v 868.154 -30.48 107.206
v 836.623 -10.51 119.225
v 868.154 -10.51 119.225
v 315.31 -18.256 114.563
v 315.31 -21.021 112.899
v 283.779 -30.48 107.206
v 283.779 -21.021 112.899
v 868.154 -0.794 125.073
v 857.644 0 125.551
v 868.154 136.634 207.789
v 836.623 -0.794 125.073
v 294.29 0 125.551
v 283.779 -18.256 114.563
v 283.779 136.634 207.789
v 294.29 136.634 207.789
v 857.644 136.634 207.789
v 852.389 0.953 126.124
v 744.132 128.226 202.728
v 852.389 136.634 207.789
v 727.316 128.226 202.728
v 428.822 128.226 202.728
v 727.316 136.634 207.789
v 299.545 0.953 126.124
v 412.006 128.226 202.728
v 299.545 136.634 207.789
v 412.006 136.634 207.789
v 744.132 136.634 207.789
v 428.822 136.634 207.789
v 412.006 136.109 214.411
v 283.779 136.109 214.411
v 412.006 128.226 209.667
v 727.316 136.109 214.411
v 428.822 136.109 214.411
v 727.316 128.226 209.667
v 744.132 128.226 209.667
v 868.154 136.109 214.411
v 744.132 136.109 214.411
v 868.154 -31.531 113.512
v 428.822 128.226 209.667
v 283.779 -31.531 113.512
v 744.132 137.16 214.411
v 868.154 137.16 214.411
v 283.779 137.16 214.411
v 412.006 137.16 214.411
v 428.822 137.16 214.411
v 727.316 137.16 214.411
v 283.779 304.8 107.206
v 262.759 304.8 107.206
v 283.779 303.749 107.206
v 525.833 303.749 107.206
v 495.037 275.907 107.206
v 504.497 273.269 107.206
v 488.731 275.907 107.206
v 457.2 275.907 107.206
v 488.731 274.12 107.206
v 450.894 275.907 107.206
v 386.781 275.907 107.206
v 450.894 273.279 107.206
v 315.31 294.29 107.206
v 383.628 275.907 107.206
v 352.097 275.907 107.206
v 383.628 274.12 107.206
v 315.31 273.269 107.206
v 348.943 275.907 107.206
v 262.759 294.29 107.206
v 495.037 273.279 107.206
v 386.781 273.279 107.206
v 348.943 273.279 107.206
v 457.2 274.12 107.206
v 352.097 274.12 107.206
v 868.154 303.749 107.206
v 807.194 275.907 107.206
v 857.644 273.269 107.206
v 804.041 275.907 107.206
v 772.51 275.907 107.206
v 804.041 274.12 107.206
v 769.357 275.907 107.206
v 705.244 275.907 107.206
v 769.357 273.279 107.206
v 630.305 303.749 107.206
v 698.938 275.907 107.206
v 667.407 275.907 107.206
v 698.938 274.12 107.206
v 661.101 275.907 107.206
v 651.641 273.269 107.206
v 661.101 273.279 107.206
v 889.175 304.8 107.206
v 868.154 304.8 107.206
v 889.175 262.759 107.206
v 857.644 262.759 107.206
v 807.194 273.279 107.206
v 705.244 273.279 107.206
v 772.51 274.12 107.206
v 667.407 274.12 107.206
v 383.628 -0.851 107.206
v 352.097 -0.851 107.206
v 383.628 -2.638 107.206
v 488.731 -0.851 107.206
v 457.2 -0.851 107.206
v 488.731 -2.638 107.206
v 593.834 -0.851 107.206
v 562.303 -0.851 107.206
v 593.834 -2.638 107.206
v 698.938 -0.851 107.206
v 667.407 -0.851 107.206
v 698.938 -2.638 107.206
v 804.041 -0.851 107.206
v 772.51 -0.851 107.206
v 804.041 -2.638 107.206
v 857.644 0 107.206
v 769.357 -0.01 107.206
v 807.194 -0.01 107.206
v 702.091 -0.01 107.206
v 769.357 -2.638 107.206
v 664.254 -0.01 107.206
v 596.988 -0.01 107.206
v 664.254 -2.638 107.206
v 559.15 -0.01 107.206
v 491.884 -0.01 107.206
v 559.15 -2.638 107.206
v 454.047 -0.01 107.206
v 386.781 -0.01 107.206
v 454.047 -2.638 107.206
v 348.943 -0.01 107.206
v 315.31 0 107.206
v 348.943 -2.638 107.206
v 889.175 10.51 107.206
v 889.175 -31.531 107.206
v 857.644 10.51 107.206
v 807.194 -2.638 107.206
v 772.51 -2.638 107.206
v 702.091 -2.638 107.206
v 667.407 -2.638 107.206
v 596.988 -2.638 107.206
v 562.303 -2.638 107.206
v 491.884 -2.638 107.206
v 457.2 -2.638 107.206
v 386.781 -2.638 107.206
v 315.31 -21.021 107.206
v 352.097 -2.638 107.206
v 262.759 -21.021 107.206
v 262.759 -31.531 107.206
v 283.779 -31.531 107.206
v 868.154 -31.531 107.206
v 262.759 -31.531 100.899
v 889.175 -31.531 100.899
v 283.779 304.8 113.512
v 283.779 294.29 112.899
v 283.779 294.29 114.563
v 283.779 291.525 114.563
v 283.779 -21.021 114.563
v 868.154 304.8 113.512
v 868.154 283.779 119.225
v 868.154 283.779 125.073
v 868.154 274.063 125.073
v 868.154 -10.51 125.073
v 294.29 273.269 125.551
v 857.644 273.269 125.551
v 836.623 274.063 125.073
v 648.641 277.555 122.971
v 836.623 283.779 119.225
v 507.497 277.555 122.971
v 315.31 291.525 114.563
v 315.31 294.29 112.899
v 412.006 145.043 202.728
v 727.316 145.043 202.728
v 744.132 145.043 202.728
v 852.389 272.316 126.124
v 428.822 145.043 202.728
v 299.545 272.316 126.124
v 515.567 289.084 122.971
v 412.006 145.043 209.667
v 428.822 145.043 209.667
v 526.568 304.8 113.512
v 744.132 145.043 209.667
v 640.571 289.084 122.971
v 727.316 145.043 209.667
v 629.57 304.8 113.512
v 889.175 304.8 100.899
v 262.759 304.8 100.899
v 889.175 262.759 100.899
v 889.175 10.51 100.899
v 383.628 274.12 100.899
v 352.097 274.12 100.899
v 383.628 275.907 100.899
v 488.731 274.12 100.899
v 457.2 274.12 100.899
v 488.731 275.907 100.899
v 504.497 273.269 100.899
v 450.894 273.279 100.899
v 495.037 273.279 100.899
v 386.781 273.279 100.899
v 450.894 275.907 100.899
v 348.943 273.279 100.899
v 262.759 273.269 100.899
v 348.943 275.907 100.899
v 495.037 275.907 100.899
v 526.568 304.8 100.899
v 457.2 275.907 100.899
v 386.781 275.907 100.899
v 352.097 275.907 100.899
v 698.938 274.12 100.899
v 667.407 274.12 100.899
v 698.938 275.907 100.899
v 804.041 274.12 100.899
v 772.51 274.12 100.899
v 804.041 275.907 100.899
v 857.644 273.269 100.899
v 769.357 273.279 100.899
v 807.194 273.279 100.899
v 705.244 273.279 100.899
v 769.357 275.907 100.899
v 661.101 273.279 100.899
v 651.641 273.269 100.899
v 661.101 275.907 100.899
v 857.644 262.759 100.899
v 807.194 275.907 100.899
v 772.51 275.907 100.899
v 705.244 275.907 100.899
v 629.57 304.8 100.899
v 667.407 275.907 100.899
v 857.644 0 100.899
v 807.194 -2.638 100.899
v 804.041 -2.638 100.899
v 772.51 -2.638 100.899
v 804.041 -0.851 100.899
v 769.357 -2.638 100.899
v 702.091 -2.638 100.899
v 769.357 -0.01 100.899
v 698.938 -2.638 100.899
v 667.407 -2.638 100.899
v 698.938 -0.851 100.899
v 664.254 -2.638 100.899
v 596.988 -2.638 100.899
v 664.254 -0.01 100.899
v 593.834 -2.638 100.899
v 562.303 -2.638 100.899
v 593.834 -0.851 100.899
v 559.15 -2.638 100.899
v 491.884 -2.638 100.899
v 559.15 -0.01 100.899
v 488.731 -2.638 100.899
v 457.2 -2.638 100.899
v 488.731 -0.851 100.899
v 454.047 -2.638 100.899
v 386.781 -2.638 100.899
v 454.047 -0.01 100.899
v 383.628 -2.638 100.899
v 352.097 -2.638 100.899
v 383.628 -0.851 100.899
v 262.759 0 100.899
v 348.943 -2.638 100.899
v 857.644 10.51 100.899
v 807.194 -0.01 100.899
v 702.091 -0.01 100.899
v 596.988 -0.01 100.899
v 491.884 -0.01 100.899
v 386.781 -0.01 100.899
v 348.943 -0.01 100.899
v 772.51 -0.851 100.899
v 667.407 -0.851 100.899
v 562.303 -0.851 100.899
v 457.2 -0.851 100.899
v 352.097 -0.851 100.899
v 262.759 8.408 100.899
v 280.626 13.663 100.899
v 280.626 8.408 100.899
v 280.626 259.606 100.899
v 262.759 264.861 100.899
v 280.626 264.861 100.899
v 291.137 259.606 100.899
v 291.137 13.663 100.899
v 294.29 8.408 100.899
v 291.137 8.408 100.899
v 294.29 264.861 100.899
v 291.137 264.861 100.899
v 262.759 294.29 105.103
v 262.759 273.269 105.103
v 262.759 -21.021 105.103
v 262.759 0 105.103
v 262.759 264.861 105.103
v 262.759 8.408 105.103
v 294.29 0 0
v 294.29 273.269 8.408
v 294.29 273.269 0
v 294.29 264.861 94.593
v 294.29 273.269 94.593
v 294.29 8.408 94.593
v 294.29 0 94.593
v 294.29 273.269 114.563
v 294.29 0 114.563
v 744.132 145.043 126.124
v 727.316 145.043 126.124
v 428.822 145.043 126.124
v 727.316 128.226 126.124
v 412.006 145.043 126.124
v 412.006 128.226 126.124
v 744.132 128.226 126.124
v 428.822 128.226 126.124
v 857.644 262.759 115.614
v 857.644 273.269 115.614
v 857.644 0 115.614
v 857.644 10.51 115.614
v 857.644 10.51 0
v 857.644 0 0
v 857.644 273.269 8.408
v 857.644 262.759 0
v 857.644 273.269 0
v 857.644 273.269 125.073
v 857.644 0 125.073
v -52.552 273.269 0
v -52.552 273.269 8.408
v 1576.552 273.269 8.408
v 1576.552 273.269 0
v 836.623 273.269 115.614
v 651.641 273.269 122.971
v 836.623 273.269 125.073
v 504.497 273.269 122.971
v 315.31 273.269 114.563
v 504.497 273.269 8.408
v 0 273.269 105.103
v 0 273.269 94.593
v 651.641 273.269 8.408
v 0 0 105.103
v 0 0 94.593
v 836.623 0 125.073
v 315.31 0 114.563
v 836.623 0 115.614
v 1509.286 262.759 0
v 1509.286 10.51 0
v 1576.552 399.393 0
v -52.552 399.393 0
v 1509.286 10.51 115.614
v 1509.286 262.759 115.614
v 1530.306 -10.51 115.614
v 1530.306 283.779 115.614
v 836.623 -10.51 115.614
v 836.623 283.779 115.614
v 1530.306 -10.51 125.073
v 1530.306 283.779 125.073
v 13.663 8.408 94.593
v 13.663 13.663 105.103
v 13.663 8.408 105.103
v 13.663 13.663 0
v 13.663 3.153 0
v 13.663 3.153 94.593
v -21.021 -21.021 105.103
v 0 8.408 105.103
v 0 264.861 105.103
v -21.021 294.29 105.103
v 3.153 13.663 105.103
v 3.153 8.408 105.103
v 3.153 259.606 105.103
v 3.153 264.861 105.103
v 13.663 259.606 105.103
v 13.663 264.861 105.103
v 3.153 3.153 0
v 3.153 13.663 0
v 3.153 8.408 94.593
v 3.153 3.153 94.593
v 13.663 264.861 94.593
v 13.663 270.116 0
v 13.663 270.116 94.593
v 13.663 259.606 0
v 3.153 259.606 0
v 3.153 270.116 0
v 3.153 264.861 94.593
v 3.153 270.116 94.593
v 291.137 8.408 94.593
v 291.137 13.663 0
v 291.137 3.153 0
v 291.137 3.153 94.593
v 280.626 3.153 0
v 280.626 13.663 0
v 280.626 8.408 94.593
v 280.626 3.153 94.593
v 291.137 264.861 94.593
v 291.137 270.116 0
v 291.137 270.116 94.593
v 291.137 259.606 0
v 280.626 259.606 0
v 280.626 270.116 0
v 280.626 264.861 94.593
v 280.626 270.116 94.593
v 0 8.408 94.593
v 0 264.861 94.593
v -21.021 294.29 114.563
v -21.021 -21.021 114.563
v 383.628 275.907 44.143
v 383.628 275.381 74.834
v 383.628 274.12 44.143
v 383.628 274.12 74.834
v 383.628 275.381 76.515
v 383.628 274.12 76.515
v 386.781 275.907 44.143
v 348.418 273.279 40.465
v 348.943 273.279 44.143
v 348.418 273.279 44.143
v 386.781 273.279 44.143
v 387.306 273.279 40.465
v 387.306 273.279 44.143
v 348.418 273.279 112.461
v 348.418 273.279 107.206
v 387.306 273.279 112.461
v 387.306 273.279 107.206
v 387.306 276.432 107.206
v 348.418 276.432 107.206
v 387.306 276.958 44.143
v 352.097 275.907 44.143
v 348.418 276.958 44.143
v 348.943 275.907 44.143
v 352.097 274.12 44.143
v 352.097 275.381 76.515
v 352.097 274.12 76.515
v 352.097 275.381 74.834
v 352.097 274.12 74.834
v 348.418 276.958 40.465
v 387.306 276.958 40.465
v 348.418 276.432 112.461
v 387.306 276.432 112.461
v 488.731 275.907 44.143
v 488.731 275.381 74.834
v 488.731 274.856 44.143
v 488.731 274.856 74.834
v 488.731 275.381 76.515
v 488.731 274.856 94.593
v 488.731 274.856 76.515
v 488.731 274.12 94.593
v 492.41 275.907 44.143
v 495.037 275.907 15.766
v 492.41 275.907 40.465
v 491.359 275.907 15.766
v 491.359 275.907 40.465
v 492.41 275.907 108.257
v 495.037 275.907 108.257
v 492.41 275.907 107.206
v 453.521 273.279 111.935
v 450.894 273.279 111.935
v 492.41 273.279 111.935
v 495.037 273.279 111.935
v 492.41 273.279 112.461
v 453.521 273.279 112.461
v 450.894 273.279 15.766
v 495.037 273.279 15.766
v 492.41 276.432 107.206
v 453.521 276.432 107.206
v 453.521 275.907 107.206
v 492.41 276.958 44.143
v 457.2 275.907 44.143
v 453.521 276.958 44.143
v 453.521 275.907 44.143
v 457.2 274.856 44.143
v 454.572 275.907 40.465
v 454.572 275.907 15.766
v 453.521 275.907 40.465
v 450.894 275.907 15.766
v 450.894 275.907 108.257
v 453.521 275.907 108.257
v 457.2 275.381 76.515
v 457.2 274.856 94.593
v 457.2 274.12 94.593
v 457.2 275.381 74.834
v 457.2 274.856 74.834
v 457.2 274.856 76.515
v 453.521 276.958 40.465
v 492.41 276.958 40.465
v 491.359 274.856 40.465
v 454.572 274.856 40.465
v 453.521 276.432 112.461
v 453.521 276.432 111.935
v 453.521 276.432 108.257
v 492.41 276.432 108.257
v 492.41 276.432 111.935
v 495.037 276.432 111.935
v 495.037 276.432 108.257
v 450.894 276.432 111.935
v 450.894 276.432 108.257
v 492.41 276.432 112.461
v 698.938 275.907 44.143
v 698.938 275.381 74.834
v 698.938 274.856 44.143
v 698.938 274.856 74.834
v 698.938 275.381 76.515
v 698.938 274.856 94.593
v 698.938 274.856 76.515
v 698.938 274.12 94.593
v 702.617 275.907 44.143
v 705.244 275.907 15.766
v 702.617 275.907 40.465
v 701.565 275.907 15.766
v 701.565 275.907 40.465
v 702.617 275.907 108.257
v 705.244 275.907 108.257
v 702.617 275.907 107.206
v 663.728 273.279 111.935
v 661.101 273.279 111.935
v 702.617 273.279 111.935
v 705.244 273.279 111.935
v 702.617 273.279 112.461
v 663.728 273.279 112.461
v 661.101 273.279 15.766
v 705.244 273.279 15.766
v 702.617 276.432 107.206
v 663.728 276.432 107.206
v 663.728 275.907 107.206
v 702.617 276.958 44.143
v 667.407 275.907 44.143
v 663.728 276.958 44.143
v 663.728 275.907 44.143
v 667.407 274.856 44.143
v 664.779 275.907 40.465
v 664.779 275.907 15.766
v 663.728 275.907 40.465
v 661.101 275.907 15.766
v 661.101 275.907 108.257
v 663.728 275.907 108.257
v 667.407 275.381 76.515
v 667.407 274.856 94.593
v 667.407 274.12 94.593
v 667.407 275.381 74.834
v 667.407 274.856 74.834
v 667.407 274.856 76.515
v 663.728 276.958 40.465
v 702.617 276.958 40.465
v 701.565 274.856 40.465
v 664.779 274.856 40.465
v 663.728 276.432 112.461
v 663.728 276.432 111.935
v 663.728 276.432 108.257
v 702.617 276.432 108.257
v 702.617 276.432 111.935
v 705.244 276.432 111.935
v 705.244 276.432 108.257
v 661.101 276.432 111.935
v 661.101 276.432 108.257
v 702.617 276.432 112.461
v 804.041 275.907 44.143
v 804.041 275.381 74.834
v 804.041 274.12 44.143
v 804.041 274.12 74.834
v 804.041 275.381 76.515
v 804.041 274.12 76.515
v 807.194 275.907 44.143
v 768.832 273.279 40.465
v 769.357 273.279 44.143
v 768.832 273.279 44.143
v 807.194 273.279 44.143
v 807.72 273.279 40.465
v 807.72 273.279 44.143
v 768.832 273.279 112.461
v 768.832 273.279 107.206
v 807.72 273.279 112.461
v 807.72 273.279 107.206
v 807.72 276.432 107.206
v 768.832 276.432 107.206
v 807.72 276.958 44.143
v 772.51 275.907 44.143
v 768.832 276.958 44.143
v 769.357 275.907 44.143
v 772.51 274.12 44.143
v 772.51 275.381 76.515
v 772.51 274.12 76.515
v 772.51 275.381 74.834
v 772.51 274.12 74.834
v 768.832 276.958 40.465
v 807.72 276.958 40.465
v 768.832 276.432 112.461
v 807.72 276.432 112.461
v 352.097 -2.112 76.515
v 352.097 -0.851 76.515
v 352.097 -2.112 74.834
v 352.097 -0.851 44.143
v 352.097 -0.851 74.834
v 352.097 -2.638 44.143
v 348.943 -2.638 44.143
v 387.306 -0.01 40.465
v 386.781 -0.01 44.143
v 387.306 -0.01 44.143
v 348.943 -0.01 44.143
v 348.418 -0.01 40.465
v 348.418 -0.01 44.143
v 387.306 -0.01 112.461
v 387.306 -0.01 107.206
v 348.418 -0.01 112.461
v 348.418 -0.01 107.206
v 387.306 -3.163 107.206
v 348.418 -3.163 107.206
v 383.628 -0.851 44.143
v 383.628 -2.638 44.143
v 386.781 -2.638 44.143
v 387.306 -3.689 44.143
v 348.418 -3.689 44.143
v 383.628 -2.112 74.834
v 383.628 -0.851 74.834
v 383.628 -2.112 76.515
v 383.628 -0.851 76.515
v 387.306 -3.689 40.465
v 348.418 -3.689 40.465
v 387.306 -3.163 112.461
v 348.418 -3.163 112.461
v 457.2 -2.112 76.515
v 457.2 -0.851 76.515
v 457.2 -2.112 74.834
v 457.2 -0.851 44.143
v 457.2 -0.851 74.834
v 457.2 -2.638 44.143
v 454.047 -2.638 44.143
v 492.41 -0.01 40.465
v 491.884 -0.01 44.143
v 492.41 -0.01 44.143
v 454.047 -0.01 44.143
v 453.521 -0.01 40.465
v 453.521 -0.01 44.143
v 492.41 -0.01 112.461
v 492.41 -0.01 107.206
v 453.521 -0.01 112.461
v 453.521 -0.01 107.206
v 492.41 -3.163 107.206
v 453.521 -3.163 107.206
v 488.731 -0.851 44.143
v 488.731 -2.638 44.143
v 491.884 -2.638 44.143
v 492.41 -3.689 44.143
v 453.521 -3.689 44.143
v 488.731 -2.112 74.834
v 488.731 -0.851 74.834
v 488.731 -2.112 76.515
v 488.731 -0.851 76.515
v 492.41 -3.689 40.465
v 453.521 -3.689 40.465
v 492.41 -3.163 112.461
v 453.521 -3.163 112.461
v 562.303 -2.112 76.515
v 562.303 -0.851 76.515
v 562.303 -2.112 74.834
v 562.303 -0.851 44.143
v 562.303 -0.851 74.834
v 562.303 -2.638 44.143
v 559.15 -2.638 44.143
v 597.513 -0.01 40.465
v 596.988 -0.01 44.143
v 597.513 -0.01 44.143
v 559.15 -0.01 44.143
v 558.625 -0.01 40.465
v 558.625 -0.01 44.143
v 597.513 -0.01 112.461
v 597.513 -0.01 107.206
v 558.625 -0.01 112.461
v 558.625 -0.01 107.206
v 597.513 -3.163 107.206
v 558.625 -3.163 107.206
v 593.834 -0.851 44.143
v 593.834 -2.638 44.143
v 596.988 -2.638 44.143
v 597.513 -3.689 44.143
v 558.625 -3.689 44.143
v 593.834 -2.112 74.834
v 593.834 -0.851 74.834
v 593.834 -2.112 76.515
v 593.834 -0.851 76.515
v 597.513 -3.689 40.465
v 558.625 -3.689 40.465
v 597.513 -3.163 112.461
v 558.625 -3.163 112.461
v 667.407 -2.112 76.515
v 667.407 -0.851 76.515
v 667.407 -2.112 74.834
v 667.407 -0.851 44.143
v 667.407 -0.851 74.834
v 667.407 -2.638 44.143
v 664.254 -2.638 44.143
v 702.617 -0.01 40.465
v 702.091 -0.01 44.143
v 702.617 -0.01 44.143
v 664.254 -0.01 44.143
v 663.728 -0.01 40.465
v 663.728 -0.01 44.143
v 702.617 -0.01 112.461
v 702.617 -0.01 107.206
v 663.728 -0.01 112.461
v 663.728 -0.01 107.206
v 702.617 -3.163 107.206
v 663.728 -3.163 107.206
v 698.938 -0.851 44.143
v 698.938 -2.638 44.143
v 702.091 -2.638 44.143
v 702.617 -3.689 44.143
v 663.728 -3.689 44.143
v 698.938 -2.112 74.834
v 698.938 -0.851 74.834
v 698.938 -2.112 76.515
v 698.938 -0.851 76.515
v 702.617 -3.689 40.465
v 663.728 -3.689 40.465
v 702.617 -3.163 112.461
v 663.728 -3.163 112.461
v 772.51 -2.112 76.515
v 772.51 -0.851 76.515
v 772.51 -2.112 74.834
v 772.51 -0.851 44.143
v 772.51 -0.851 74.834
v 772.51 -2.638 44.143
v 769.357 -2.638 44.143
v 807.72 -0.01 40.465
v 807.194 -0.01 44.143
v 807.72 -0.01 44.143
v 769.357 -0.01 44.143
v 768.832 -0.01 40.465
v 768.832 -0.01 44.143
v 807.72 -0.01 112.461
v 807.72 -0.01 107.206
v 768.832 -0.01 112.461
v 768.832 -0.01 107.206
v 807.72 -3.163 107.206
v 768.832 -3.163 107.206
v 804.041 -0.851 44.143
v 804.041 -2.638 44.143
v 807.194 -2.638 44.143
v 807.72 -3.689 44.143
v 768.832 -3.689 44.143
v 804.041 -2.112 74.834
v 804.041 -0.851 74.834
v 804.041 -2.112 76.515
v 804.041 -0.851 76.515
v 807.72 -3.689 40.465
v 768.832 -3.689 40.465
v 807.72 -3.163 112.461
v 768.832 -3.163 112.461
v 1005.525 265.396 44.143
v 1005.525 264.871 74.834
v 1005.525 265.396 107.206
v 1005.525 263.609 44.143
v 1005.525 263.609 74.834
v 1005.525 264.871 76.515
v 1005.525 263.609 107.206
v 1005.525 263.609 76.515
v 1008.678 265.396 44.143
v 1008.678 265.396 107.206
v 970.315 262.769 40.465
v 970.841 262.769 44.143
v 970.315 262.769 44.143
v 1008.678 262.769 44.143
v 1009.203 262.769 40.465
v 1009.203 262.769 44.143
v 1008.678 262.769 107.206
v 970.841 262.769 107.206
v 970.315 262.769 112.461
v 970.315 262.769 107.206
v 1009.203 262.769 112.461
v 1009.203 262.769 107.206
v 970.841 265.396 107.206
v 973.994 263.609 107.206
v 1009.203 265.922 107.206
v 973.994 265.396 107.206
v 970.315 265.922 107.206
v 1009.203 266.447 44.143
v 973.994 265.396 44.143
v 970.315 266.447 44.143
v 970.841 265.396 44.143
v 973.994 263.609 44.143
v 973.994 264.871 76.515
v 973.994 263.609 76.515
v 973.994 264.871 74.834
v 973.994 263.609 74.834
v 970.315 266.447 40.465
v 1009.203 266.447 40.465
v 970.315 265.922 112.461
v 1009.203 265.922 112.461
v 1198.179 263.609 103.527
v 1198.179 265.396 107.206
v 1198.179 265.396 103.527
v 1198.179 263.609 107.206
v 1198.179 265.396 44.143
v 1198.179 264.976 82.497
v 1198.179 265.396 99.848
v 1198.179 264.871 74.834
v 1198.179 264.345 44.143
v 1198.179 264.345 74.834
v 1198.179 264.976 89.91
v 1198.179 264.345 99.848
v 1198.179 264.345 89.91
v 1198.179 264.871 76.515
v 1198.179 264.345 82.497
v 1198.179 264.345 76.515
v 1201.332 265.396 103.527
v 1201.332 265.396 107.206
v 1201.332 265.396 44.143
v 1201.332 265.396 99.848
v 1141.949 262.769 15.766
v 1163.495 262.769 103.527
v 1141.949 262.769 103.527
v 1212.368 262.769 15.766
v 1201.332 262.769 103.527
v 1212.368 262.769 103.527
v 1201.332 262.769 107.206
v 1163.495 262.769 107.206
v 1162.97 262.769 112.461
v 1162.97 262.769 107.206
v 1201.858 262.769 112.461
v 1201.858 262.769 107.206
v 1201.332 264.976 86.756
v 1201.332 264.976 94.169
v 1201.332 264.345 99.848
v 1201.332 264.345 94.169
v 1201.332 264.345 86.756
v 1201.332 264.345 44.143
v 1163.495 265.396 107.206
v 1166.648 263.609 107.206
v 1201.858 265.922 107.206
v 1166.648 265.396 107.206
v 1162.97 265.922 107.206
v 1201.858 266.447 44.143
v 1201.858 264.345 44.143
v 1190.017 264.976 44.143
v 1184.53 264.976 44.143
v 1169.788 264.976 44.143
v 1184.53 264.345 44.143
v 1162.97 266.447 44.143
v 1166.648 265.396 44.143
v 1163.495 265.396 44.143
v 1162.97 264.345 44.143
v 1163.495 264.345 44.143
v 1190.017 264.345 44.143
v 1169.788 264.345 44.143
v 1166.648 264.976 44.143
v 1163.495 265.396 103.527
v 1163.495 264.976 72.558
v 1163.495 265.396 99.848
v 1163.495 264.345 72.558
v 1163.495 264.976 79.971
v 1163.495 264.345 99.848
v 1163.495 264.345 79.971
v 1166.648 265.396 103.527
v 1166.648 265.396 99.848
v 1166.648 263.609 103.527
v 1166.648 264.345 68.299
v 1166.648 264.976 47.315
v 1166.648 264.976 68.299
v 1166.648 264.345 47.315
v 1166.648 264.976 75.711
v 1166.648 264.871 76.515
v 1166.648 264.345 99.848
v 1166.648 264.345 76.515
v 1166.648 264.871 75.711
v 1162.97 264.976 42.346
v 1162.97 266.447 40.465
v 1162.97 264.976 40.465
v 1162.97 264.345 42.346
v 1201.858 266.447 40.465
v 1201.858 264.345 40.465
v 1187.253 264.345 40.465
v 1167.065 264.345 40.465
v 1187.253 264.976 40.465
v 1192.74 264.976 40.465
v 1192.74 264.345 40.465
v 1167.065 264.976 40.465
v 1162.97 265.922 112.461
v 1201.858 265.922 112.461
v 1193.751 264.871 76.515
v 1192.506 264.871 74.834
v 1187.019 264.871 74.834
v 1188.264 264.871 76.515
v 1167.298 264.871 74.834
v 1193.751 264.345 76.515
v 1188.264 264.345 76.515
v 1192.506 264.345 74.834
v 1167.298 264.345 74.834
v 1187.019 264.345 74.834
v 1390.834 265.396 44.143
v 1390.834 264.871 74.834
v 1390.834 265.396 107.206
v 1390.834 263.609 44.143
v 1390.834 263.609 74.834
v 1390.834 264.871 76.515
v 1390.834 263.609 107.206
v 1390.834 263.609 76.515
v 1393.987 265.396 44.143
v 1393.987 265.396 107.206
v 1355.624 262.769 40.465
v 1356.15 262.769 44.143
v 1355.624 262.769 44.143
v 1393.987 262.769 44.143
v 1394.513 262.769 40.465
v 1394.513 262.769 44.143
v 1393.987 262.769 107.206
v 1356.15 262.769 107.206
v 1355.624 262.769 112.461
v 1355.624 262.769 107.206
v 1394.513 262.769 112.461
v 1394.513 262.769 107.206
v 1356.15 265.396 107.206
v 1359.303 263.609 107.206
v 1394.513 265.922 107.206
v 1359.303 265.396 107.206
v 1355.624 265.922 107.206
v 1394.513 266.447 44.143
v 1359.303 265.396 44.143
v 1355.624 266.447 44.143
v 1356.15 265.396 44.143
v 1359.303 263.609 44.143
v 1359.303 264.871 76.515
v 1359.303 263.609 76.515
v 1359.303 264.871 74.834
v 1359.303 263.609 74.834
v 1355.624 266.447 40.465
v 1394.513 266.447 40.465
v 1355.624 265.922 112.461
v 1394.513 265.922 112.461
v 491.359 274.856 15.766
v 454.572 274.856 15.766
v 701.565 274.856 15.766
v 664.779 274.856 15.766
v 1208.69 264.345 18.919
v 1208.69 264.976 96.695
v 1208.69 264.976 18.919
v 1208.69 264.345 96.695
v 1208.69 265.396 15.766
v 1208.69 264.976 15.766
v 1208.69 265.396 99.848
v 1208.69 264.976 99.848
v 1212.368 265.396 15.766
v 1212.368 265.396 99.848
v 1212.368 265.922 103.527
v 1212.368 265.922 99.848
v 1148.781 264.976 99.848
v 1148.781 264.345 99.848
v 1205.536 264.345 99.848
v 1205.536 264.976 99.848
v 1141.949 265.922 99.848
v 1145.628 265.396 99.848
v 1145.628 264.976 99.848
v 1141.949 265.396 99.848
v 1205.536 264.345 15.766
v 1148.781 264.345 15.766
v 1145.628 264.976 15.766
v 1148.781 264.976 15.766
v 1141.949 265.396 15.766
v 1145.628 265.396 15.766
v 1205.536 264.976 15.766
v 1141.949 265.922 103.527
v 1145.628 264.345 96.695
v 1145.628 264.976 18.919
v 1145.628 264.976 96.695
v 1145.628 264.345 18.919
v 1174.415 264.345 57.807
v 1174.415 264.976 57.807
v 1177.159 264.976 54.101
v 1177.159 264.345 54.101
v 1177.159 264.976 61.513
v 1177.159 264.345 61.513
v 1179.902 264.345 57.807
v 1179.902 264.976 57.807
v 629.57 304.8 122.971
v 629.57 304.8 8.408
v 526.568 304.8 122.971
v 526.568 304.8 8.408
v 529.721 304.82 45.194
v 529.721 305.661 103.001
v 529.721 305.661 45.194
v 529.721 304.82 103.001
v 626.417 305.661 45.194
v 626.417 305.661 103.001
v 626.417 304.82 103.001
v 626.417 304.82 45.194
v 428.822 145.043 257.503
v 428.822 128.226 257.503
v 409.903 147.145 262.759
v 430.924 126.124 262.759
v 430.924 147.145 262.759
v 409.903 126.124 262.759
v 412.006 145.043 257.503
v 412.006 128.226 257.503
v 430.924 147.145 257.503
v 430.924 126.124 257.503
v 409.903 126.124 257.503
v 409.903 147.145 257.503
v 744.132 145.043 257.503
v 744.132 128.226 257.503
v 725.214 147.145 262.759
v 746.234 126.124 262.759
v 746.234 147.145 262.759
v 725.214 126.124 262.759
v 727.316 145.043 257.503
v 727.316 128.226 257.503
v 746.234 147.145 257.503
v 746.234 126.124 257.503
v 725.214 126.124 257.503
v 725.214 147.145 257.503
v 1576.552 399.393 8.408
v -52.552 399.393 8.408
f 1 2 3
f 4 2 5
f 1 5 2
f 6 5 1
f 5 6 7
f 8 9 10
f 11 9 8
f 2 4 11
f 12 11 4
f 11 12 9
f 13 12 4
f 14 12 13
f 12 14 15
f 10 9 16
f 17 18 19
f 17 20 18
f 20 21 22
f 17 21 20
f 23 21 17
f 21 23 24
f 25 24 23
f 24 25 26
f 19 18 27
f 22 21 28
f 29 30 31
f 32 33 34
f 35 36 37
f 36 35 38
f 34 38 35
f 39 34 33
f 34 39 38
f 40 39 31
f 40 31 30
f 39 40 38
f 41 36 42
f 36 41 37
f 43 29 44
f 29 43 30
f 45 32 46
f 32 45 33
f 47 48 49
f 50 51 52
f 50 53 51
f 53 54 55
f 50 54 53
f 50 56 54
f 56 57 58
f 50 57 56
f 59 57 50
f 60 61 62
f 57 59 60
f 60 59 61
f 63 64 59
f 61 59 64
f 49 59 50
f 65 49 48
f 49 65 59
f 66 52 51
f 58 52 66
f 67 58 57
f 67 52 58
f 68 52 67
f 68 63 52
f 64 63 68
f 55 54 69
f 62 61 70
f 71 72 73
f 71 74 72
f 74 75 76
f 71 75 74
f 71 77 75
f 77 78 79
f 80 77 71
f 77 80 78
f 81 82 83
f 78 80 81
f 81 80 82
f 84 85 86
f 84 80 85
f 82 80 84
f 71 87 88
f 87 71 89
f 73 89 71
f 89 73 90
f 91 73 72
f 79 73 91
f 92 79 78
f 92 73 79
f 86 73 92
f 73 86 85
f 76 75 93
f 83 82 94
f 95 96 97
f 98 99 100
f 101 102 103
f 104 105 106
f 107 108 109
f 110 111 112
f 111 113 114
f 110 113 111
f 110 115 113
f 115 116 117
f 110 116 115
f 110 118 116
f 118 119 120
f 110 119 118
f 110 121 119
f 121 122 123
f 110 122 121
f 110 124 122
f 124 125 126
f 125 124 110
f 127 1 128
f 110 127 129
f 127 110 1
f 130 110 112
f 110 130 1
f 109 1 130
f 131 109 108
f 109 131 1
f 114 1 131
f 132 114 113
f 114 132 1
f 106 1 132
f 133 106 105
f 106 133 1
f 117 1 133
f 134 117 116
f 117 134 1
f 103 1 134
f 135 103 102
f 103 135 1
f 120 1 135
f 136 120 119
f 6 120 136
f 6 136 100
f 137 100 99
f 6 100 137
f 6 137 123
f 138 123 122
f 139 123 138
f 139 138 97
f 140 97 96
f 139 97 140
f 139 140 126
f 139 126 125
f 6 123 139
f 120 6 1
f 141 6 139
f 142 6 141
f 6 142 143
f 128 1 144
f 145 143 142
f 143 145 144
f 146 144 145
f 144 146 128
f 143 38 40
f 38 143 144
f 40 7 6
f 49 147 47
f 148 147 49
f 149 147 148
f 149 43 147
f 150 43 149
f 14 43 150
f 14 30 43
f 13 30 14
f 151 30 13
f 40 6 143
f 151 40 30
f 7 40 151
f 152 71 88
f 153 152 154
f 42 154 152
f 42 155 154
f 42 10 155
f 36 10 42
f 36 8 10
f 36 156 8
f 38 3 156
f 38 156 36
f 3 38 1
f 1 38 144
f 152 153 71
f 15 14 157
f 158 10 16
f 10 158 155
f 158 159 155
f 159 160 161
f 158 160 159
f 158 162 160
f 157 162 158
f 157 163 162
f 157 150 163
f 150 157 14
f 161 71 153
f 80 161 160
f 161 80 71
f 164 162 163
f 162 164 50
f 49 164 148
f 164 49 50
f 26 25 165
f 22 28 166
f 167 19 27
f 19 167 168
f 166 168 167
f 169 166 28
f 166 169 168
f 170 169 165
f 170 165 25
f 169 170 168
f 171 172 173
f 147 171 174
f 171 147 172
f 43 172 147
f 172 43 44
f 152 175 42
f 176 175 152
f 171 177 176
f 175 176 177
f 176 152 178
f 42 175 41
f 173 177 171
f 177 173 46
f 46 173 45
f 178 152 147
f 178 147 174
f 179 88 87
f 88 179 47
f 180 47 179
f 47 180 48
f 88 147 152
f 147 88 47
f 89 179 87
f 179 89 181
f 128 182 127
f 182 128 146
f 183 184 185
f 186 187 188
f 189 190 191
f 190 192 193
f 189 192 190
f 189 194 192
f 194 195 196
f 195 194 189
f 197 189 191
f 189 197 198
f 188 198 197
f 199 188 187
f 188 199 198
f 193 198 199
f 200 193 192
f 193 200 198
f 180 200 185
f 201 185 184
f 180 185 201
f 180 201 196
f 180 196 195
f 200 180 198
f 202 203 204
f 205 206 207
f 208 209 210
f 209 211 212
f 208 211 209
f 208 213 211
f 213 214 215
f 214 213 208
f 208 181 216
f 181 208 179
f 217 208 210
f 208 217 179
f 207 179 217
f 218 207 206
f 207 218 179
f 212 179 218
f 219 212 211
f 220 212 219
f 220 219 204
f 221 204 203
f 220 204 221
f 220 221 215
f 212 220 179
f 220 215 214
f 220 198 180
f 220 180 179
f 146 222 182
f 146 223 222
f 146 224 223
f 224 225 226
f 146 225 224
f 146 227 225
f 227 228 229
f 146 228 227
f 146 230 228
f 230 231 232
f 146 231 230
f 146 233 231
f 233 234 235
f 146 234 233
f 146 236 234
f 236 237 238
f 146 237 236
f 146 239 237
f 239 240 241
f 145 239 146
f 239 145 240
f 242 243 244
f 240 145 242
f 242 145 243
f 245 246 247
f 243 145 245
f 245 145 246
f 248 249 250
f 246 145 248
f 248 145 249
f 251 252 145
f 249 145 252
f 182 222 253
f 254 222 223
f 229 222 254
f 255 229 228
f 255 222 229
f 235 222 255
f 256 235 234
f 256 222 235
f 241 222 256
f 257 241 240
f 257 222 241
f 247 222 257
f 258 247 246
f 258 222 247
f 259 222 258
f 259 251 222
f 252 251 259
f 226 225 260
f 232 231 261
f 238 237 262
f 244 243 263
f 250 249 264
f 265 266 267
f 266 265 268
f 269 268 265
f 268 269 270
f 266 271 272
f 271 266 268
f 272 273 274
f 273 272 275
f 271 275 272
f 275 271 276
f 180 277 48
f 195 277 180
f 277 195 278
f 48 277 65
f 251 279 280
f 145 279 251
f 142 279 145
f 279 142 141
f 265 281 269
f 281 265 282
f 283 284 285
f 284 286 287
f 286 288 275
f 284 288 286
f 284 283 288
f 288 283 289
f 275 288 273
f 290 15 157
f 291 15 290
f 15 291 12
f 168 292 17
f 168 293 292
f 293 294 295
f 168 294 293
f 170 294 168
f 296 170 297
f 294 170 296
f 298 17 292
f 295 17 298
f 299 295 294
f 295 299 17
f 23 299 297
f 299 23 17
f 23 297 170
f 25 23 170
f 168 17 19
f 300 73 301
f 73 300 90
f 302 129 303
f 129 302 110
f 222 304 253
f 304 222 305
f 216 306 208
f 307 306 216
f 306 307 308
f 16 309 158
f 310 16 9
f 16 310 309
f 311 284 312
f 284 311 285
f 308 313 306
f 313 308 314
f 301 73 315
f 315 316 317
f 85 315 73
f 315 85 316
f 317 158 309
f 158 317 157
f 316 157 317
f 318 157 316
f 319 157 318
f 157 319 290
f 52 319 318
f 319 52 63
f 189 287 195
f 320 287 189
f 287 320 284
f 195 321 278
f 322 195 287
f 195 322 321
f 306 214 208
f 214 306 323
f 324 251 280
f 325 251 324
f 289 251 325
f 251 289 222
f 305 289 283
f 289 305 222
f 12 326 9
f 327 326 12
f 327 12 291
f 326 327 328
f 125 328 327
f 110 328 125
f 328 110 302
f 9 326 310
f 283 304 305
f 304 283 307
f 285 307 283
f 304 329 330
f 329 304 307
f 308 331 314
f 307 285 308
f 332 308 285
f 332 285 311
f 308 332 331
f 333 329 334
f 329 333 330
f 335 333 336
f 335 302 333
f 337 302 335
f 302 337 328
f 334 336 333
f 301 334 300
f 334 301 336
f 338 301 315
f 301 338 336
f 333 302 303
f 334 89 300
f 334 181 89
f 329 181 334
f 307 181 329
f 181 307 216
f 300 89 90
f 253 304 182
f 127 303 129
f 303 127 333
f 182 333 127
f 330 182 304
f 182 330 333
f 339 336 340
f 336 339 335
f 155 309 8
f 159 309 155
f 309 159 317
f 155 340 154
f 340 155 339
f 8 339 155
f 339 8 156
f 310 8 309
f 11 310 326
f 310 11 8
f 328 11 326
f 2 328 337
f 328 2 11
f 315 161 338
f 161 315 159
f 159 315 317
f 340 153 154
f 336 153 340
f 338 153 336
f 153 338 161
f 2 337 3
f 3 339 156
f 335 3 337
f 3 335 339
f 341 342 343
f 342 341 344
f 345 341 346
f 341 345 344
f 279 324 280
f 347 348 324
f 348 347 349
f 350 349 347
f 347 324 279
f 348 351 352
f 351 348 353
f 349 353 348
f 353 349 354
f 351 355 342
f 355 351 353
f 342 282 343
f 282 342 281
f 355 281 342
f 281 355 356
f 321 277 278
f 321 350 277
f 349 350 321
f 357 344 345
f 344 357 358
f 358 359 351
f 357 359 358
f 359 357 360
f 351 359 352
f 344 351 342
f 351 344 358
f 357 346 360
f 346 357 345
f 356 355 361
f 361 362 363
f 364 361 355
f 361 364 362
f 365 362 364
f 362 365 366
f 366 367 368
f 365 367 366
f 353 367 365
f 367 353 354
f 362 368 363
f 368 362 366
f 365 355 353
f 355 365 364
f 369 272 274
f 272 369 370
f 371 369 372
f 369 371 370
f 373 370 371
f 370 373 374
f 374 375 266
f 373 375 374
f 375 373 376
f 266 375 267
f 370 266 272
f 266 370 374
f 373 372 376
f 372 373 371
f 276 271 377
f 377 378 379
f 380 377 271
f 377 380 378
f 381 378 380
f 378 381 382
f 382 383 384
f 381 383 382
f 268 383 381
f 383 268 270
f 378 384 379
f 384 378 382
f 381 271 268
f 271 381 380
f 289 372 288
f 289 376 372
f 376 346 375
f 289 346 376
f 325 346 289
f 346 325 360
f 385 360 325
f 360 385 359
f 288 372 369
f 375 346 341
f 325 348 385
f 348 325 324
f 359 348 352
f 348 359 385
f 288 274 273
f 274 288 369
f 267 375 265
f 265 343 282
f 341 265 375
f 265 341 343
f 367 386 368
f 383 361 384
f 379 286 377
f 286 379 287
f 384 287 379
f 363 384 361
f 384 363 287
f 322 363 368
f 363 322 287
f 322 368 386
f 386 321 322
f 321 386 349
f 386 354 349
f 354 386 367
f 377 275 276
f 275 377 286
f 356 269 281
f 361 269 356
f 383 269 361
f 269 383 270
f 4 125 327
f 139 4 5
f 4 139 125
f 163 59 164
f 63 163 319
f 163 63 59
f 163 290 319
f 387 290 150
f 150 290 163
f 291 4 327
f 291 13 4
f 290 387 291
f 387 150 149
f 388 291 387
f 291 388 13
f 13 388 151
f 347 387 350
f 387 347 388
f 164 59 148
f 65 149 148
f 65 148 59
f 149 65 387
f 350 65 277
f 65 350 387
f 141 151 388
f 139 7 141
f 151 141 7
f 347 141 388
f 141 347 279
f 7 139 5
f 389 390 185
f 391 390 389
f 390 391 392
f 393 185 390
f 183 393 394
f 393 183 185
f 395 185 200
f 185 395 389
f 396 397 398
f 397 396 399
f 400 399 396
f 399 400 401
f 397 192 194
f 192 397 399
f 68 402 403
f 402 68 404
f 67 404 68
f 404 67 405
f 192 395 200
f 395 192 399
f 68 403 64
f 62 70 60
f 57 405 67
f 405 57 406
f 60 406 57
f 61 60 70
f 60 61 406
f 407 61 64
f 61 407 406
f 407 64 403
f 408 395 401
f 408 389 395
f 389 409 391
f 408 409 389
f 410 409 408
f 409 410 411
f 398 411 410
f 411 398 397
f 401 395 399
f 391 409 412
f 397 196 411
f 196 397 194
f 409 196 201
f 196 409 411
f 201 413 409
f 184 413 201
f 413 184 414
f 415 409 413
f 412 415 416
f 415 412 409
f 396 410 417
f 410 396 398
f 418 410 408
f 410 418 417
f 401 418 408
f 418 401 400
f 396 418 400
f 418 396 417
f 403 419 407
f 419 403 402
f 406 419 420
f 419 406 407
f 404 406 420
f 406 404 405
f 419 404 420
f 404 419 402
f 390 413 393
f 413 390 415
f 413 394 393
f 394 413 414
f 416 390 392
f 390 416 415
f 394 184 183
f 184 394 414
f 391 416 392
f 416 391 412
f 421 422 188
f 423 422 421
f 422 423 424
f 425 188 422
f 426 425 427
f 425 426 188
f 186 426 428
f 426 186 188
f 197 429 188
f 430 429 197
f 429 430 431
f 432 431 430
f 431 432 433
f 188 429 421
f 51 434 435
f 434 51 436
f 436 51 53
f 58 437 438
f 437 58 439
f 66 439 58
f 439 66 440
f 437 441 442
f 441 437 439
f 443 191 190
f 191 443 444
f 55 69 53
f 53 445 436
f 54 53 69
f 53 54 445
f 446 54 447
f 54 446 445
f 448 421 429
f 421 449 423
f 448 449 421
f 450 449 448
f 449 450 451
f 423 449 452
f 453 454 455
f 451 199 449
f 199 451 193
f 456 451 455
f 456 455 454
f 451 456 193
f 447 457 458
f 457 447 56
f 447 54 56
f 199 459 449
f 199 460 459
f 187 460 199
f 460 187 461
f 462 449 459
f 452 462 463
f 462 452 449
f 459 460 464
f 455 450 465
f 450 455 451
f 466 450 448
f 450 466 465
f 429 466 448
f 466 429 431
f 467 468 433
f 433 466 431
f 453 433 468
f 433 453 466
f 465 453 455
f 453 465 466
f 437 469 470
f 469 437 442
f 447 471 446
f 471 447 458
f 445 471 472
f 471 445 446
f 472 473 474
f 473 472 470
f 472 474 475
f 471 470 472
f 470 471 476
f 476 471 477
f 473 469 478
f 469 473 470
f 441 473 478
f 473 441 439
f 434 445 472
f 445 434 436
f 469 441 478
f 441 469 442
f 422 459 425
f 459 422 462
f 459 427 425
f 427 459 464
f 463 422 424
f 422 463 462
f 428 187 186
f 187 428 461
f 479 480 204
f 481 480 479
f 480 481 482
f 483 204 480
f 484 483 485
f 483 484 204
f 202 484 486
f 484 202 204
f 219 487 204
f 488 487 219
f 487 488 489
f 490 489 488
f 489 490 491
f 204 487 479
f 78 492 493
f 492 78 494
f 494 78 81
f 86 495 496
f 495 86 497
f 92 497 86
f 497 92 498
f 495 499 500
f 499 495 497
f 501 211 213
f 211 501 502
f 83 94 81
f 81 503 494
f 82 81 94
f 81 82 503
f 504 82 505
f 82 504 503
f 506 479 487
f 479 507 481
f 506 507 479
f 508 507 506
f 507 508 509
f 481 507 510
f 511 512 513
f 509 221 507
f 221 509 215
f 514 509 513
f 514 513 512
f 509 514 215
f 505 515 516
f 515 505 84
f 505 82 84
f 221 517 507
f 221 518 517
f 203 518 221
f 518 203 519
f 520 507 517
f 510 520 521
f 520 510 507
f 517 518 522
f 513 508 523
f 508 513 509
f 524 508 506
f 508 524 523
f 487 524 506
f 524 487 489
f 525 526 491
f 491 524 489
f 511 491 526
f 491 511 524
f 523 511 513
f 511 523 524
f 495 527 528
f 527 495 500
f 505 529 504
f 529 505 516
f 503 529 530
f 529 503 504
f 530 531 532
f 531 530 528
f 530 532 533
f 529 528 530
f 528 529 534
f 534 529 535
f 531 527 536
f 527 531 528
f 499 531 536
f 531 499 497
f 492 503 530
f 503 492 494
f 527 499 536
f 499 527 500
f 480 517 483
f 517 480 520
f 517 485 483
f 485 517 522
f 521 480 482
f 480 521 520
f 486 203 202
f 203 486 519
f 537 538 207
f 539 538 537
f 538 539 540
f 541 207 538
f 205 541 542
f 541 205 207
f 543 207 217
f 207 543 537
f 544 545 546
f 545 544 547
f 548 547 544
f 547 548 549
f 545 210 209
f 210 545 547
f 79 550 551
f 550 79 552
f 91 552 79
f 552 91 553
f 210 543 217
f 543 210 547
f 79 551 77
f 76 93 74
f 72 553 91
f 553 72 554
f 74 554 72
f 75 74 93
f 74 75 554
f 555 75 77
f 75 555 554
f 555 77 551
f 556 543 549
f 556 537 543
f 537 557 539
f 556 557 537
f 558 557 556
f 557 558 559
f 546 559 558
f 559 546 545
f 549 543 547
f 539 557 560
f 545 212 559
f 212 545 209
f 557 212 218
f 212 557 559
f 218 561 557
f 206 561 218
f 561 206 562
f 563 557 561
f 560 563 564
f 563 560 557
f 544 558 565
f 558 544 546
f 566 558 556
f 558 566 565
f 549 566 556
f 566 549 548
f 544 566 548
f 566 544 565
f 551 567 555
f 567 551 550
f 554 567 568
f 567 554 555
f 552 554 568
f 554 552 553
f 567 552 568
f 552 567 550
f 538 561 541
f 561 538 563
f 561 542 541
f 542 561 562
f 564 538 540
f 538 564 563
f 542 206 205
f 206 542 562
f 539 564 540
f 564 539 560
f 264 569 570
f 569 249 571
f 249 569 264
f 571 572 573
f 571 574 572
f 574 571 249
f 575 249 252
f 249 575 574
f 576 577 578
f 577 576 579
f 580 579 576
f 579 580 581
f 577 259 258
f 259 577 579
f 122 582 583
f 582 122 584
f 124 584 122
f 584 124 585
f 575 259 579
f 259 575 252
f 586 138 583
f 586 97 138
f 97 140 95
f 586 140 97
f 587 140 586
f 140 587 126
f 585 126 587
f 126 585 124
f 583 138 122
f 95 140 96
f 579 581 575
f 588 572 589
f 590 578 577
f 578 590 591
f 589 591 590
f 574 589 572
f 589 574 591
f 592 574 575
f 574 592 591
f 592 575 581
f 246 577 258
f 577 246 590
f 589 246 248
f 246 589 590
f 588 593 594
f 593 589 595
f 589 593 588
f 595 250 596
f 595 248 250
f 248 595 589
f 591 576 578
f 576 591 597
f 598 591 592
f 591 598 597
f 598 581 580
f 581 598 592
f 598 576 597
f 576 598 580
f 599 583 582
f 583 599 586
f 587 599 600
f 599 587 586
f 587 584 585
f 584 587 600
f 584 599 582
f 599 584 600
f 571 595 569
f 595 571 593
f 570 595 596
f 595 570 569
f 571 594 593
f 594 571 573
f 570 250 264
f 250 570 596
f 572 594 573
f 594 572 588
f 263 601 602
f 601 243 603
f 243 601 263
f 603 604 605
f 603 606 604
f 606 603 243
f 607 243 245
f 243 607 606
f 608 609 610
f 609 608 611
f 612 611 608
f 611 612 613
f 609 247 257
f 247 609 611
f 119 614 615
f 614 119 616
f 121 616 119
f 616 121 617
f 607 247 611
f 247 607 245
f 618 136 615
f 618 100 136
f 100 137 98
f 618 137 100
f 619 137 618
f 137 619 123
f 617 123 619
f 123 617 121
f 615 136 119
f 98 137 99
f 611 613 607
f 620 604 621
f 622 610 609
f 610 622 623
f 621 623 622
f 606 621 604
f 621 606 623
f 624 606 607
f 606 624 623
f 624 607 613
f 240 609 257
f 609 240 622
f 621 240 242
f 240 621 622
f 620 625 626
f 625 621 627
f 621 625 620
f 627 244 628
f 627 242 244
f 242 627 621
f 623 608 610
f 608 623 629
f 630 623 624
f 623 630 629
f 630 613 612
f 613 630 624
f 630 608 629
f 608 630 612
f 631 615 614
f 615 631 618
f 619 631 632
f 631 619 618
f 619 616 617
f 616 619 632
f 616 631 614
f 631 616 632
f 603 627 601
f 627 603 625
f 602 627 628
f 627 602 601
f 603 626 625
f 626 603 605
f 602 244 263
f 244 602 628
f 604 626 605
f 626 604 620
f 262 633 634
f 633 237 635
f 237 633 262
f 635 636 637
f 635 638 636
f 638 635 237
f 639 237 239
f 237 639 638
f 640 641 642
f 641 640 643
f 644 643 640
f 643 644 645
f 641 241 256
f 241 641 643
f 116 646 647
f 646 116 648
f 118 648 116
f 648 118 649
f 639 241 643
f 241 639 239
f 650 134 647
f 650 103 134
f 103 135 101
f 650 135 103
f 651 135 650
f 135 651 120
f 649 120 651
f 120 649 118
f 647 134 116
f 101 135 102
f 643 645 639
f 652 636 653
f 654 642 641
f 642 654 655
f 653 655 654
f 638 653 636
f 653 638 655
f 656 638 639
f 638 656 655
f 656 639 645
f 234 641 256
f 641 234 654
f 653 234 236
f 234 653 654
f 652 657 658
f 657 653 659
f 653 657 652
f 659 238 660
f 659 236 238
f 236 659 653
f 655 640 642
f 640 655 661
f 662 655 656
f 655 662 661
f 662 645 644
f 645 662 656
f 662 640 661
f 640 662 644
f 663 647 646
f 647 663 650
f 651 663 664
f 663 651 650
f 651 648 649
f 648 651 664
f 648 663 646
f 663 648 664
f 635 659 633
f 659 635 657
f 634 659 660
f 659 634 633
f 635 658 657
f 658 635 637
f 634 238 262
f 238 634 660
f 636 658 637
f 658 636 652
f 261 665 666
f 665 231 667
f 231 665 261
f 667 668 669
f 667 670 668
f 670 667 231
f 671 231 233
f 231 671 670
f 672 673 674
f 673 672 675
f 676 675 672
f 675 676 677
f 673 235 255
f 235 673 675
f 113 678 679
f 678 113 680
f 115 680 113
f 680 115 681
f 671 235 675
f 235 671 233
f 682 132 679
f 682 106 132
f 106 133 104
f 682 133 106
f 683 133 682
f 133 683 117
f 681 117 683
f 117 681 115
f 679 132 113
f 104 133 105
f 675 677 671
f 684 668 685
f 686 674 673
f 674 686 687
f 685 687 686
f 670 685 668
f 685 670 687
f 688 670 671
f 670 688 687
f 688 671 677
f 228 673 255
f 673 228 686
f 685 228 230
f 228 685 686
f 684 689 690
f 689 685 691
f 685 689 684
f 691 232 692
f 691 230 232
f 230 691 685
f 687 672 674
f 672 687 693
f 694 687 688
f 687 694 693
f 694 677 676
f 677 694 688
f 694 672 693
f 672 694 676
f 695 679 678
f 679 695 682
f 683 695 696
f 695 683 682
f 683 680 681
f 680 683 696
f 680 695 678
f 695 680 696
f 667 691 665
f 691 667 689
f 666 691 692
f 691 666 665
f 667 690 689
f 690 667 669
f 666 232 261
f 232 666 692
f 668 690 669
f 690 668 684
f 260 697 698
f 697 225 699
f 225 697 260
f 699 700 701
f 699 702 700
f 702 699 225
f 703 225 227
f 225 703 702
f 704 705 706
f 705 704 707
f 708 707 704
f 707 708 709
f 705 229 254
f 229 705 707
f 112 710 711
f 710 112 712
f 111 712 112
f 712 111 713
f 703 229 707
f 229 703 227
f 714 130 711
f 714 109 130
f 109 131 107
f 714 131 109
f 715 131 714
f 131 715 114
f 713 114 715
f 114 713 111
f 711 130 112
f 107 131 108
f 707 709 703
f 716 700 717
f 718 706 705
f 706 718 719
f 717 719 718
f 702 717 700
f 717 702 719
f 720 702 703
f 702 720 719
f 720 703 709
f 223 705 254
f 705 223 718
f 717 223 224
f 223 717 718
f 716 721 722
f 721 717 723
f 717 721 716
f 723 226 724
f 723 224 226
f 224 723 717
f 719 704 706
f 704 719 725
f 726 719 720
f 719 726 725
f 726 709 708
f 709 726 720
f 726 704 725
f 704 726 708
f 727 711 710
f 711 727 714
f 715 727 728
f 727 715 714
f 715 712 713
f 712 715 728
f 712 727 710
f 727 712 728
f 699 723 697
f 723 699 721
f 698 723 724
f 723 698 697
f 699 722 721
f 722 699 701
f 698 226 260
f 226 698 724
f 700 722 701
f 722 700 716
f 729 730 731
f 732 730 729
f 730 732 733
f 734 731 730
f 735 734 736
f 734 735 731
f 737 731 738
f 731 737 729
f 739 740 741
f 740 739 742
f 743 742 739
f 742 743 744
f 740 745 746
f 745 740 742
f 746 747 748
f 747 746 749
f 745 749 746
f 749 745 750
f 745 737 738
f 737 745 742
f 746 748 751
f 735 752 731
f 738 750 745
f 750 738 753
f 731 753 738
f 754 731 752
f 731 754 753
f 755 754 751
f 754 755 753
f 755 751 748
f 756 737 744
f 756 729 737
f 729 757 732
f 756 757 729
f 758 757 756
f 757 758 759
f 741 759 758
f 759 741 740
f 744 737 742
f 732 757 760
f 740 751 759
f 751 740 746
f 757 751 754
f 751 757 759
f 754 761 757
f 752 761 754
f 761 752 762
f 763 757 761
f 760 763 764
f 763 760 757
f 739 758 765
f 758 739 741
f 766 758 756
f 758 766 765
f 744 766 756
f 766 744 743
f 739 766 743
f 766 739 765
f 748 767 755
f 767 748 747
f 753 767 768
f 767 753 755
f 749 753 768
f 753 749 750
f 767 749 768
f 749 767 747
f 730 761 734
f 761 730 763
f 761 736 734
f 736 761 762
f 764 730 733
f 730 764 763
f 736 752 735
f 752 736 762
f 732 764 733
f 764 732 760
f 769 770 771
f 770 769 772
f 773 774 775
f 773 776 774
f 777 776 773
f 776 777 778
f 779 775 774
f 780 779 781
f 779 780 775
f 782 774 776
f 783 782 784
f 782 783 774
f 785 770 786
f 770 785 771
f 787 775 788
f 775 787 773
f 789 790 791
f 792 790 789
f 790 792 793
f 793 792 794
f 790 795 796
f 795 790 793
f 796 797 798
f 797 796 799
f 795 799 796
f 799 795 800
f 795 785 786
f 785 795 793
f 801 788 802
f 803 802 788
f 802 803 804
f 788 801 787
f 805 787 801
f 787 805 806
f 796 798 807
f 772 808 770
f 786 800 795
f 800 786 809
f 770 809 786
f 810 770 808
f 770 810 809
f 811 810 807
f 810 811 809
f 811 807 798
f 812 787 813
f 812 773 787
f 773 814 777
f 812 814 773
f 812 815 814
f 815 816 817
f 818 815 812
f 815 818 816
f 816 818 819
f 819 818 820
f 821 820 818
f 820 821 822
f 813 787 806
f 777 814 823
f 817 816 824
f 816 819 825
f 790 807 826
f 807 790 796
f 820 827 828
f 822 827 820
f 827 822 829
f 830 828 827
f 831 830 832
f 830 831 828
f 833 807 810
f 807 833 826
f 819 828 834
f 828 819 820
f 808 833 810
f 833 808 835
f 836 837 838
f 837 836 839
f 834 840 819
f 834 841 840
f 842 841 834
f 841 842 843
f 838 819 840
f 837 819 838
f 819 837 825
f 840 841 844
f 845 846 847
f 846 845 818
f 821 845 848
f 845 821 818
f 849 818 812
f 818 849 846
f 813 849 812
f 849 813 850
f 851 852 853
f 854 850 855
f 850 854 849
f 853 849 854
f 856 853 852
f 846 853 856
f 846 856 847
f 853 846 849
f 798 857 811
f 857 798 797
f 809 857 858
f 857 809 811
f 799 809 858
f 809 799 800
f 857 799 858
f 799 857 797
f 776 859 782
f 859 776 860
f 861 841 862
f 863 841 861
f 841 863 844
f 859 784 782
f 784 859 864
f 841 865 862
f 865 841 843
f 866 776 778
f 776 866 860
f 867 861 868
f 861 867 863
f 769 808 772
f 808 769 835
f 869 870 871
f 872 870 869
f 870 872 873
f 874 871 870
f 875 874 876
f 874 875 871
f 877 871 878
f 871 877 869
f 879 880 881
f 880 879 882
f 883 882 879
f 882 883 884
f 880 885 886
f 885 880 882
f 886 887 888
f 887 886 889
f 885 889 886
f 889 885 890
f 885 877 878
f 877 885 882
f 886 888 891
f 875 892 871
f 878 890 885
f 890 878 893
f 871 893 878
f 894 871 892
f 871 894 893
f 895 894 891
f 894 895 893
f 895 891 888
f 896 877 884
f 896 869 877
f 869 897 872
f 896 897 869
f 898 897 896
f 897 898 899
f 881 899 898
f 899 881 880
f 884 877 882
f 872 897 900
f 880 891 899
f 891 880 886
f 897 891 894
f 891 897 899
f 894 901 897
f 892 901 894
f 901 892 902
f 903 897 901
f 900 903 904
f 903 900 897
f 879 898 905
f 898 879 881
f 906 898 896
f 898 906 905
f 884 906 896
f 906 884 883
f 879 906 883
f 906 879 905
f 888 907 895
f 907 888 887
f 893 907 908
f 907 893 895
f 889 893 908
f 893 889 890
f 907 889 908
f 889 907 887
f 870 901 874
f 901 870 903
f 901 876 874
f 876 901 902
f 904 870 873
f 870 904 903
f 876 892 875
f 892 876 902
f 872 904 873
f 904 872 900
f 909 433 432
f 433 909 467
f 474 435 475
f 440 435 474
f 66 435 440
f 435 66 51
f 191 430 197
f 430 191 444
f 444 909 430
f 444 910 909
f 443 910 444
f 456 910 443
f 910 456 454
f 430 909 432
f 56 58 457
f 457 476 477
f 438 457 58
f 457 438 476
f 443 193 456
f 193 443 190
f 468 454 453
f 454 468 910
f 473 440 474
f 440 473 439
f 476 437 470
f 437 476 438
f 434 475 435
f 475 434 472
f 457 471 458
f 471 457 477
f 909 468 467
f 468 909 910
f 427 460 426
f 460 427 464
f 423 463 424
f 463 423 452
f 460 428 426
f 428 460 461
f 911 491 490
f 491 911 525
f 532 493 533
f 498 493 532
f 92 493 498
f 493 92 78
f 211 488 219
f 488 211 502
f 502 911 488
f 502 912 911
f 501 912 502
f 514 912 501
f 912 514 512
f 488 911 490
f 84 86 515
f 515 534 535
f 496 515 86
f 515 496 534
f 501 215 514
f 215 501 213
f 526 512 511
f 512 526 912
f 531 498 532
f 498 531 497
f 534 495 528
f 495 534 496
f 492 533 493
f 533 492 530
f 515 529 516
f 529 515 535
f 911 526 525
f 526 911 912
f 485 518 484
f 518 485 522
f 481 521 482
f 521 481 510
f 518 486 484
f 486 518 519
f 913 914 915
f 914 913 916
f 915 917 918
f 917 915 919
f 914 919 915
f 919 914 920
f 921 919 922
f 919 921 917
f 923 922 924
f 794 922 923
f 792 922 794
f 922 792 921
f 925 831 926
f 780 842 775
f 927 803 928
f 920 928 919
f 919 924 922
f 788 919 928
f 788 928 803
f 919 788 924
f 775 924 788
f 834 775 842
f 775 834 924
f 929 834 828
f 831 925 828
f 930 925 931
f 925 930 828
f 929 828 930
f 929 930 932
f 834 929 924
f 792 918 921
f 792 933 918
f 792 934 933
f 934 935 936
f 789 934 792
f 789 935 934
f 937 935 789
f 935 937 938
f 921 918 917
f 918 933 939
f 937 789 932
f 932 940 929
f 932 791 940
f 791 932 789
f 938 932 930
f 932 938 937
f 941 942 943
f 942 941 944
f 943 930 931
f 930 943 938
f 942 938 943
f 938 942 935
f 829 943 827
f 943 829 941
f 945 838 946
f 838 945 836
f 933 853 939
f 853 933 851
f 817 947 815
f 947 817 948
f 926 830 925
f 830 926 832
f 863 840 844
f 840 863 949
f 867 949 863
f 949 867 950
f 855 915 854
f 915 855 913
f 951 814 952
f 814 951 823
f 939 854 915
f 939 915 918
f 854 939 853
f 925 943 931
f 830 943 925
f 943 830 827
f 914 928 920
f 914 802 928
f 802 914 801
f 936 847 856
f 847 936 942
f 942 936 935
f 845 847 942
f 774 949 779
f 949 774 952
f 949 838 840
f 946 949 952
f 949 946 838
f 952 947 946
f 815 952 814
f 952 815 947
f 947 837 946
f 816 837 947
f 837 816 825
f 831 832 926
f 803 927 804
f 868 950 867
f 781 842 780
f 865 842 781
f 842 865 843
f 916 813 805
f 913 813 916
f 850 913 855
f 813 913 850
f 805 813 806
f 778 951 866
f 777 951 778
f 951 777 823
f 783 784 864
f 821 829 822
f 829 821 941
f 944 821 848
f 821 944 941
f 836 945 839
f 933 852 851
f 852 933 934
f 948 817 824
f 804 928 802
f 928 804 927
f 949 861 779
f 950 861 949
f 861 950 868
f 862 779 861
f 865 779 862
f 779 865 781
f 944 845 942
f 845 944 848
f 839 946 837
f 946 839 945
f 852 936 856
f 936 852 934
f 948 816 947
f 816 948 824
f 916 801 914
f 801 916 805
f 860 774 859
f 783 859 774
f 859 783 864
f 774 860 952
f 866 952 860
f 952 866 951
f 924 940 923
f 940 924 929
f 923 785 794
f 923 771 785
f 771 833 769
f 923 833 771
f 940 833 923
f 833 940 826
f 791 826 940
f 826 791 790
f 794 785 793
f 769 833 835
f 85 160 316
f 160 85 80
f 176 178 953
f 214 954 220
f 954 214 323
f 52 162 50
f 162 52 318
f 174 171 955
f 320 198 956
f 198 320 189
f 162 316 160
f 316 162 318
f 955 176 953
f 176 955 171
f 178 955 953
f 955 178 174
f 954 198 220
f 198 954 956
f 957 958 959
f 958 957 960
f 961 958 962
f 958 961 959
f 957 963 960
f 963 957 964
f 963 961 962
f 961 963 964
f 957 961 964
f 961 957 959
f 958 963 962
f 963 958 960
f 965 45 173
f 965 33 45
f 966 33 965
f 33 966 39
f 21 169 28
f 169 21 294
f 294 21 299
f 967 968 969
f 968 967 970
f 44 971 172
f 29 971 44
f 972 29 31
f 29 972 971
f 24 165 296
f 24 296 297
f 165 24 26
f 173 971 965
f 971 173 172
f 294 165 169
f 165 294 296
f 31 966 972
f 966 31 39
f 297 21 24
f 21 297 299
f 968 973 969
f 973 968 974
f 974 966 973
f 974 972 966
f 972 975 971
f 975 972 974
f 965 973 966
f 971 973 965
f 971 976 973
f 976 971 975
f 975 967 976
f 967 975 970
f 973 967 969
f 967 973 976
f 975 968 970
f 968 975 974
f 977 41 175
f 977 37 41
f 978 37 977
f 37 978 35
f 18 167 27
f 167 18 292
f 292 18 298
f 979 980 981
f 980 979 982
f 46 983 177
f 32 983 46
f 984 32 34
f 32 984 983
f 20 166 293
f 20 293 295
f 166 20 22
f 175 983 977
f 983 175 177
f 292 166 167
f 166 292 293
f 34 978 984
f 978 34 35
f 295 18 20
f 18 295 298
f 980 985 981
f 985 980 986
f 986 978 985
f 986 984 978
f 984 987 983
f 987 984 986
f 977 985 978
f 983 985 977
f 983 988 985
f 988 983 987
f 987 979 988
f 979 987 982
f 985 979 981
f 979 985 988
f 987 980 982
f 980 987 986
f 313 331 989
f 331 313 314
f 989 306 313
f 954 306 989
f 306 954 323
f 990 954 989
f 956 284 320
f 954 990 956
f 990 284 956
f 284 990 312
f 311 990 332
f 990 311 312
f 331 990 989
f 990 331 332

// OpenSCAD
// =====================================================================
//  MILWAUKEE ROAD - KIEL, WIS. PASSENGER STATION
//  Source: Album sheet 93, built 1916 (drawn Aug 9 1916).  Drawings are private reference (in copyright):
//  Research Library / RSW / Stations / Standard depots / Album of Depot Plans 1919.
//  Rib Side Works, 24 Nov 2026. FIRST SHAPE MODEL for review - not cut into print sections.
//  KNOWN (from the sheet): 113 ft 8 in + 28 ft pavilion; station 53 ft 8 x 26 (general waiting 19 ft 6 x 24 ft 8, ticket office 12 ft 2 x 15 ft 2, smoking 11 ft 6 x 24 ft 8), freight and baggage 62 x 24 (tar and gravel); stucco, asbestos shingles, clerestory dormer.
//  ESTIMATE: wall and ridge heights where not written, window count and spacing, colours.
//  Built with the shared depot builder ../../../_common/rsw_depot.scad (x along the track,
//  y = 0 town side, track side +y, feet).  SCALE: 29 = G, 48 = O, 87 = HO.
// =====================================================================
SCALE = 29;
include <../../../_common/rsw_depot.scad>

depot(blocks = [[28, 53.6, 0, 26, 12, 0.6, 1, 3, 1], [81.6, 62, 1, 24, 11, 0, 4, 2, 1]],
      pavs   = [[0, 28, 0, 26, 10, 0.1, 4, 2, 2, 2]],
      wins   = [[35.0, 1, 3, 6, 4.2], [45.0, 1, 3, 6, 4.2], [55.0, 1, 3, 6, 4.2], [65.0, 1, 3, 6, 4.2], [75.0, 1, 3, 6, 4.2], [35.0, 0, 3, 6, 4.2], [45.0, 0, 3, 6, 4.2], [55.0, 0, 3, 6, 4.2], [65.0, 0, 3, 6, 4.2], [75.0, 0, 3, 6, 4.2], [94.17, 1, 3, 6, 4.2, 1], [112.5, 1, 3, 6, 4.2, 1], [130.83, 1, 3, 6, 4.2, 1]],
      doors  = [[45, 1, 3.5, 7.5, 0], [65, 1, 3.5, 7.5, 0], [112, 1, 6, 8, 2, 1]],
      bays   = [[55, 1, 14, 3]],
      chims  = [[40, 13, 25], [70, 13, 25]],
      plat   = [-5, 155, 12, 0.8]);
